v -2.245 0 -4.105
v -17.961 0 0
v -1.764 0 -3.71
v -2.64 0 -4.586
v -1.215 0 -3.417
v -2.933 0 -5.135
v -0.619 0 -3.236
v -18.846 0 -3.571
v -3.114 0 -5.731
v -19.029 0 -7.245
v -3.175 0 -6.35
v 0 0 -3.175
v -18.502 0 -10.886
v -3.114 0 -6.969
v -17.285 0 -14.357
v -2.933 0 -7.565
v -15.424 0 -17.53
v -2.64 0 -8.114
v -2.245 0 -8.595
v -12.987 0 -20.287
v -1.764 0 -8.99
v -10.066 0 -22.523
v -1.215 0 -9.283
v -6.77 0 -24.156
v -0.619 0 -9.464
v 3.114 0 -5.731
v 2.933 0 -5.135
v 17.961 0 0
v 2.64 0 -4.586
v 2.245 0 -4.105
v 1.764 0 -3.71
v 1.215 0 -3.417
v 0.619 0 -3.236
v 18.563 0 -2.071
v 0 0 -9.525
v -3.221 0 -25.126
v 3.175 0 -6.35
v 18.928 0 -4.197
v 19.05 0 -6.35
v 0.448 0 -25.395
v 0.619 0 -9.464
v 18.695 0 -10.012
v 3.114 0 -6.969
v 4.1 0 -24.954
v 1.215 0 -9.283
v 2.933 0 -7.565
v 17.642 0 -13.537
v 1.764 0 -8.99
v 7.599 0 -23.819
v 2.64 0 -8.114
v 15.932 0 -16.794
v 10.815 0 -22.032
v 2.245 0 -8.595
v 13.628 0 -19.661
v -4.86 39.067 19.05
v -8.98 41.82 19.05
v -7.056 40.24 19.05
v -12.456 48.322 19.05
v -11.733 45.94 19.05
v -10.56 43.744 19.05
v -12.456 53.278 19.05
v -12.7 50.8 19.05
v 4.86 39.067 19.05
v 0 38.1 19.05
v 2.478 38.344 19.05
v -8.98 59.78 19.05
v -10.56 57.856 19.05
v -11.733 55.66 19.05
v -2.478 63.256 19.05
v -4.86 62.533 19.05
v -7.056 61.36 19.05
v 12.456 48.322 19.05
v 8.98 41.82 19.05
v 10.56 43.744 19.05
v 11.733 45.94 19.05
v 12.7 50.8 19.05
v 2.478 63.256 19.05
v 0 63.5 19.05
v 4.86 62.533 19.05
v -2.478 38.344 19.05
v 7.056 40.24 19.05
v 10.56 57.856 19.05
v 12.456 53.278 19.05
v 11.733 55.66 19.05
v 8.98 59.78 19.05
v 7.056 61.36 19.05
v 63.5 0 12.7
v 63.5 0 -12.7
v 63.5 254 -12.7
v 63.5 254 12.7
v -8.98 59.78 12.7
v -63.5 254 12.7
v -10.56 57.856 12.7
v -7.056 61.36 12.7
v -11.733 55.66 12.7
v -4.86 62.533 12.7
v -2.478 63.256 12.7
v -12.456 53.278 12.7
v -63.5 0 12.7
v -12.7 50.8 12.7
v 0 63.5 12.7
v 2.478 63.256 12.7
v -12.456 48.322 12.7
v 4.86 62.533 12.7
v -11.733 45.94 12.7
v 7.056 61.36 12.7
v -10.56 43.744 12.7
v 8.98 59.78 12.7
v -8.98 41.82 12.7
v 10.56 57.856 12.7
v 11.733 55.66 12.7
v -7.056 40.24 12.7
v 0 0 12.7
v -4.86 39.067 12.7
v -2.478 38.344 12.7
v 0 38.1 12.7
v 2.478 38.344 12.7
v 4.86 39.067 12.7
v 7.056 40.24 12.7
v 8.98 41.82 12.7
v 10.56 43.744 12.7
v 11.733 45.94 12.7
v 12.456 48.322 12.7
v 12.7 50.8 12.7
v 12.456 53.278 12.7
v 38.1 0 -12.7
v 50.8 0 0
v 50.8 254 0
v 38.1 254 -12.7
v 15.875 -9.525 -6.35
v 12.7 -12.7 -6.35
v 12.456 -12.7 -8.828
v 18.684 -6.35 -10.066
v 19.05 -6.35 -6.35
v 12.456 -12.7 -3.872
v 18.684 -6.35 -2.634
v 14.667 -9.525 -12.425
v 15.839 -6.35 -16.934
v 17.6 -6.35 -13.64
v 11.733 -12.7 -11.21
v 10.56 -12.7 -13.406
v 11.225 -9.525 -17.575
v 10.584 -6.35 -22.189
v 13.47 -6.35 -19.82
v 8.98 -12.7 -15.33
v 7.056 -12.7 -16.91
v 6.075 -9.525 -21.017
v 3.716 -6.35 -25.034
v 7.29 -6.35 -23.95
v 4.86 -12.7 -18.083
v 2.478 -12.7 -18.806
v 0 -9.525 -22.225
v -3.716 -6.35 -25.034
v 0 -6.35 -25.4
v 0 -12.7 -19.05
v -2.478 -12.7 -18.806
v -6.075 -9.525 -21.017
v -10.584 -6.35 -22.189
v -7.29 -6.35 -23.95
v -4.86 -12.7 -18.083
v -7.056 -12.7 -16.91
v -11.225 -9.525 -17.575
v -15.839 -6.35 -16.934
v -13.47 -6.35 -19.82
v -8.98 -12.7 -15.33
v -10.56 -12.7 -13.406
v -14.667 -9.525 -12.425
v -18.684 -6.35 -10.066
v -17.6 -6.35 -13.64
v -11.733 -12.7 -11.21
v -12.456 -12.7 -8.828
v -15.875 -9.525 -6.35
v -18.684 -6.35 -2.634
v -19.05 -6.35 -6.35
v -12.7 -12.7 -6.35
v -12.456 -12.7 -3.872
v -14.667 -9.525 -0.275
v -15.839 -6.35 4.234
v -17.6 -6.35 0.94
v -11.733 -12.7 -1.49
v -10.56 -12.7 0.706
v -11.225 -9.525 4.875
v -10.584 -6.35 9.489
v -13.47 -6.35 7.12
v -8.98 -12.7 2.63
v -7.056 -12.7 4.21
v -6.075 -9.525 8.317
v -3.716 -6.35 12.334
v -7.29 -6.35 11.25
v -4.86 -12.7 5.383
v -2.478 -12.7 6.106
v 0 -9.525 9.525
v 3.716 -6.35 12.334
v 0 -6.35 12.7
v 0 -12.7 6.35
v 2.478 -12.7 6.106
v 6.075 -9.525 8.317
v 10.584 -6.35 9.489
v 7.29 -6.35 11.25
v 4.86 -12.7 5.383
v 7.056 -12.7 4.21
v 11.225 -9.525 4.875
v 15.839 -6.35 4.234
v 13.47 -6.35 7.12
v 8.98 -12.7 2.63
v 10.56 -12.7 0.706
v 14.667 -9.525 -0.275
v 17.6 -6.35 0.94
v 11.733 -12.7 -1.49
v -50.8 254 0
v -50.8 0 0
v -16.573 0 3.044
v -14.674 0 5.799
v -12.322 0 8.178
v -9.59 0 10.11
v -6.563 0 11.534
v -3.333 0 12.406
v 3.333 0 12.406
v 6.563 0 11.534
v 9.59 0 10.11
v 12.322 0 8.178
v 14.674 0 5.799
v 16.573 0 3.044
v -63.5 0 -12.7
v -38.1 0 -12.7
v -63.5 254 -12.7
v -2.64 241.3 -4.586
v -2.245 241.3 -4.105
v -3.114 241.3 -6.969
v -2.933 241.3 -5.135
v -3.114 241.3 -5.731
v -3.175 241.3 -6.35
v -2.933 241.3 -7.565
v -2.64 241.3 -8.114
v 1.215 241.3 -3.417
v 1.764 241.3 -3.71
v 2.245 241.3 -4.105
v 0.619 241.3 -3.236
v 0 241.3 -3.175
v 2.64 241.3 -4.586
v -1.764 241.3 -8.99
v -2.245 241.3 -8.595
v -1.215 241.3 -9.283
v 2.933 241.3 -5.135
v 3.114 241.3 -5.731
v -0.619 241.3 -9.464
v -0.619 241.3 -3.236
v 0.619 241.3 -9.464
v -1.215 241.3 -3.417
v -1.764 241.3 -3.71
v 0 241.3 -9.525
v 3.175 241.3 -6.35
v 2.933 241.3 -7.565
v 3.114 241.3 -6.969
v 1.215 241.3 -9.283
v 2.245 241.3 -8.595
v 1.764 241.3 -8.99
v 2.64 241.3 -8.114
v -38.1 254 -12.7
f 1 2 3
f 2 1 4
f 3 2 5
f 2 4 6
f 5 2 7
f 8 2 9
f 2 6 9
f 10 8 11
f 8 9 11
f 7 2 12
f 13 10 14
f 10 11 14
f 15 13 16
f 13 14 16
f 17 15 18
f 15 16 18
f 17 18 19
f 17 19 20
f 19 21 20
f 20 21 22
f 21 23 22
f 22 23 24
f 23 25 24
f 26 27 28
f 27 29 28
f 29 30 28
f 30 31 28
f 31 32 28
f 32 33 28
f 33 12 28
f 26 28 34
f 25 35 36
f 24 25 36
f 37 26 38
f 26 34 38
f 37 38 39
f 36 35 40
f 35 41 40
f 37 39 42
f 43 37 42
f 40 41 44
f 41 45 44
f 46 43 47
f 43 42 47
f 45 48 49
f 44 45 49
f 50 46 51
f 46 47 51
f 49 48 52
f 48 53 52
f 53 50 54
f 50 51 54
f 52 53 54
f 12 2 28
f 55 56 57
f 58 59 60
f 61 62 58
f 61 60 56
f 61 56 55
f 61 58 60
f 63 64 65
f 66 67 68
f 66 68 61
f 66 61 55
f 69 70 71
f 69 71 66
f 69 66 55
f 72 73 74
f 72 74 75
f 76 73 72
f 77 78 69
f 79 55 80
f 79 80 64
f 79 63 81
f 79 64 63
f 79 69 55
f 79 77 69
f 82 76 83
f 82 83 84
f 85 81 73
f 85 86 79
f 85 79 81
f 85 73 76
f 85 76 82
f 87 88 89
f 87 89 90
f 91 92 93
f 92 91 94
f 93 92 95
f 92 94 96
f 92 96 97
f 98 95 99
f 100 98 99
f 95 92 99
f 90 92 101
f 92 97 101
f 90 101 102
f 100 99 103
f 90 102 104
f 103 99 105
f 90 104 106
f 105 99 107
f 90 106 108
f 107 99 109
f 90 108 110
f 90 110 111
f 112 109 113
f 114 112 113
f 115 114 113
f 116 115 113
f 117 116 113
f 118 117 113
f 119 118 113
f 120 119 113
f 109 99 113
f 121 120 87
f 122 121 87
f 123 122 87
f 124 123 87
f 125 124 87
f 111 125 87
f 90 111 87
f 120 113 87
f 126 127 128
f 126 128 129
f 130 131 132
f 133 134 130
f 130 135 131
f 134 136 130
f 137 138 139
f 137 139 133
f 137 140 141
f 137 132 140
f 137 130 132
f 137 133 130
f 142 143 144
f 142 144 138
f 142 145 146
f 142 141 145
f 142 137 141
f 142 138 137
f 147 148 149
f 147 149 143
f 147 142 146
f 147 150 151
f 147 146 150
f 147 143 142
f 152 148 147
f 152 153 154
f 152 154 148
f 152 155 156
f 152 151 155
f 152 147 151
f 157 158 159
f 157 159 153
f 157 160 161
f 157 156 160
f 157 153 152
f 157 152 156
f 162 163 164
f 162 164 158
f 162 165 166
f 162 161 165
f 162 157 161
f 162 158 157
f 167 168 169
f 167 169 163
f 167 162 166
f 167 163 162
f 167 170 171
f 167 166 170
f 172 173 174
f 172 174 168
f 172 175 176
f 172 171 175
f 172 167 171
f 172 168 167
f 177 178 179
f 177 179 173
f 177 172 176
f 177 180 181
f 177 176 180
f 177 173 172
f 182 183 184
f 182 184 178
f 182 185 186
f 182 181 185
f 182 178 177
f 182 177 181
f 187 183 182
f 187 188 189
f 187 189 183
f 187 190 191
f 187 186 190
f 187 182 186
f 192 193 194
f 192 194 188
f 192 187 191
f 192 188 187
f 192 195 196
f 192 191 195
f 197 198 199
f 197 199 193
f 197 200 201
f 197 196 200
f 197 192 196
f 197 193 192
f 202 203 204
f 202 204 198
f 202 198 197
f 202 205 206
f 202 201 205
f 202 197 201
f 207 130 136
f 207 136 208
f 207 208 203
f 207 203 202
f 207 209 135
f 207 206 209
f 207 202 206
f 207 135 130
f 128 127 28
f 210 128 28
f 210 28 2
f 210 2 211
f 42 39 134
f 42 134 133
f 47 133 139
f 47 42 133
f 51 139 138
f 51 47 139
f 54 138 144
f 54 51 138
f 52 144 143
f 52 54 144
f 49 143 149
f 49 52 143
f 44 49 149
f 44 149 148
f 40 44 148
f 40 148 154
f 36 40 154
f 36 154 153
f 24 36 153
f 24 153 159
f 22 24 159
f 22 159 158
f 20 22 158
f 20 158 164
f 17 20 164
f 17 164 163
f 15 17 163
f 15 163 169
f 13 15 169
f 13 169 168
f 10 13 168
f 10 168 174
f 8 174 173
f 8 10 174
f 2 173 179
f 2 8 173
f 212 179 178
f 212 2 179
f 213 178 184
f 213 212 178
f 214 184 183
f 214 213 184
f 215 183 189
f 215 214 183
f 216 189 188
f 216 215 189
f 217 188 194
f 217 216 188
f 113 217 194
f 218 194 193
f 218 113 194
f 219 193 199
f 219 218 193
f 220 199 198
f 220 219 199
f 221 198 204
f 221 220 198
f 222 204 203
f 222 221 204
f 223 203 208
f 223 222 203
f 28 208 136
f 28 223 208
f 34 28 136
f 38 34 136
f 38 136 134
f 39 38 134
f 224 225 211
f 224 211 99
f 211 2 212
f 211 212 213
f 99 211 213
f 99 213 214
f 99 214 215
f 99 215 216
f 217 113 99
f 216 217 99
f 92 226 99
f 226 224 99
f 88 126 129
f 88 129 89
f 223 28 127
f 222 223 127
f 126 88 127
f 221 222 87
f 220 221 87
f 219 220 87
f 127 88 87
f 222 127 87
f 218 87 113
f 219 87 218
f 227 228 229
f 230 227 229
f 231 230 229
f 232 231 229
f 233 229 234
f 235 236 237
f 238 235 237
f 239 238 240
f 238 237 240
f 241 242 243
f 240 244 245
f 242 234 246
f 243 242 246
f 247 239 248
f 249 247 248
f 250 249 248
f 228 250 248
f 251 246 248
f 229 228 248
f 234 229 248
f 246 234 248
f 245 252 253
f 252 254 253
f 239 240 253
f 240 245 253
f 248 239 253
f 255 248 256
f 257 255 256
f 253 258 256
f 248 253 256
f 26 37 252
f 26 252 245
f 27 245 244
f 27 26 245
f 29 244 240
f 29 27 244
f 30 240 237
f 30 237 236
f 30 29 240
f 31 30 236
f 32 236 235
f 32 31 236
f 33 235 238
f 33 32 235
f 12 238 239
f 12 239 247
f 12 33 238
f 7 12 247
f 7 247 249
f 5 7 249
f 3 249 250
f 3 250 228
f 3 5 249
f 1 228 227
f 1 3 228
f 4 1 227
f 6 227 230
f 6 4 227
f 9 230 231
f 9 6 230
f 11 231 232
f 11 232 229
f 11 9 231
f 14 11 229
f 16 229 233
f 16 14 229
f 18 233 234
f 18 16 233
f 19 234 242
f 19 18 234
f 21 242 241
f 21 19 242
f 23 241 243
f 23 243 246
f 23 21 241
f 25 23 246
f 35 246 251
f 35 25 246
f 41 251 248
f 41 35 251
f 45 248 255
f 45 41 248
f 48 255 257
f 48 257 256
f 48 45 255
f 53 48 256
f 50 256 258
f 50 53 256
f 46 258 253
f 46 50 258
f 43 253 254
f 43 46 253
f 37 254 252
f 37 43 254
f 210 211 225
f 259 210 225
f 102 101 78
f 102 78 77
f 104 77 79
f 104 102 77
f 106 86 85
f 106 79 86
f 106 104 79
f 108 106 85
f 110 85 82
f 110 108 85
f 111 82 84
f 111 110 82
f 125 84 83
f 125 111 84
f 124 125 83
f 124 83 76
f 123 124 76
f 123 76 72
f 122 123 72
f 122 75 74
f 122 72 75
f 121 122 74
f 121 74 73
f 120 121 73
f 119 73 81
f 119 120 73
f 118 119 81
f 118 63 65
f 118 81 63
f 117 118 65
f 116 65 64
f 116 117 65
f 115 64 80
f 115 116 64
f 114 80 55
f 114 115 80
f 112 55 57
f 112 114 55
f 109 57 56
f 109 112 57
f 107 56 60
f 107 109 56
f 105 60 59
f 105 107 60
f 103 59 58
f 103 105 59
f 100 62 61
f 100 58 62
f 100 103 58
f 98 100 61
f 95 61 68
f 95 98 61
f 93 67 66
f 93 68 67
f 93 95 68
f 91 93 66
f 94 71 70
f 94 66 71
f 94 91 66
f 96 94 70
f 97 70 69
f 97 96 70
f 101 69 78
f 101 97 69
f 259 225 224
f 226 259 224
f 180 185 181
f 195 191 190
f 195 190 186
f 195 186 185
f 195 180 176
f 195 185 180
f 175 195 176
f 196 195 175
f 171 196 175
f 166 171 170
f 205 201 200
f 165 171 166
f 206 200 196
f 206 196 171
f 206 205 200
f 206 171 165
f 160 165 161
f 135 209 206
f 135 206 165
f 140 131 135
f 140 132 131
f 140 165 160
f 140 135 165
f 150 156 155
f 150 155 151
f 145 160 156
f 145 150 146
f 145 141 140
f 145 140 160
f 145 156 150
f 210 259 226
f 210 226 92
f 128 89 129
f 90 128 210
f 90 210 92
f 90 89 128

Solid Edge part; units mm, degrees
sketch "Sketch1" plane through (0, 0, 0) normal (0, -1, 0) x (1, 0, 0)
  line L0 (-63.5, 12.7) -> (63.5, 12.7)
  line L1 (63.5, -12.7) -> (63.5, 12.7)
  line L2 (38.1, -12.7) -> (63.5, -12.7)
  line L3 (50.8, 0) -> (38.1, -12.7)
  line L4 (0, 0) -> (50.8, 0)
  line L5 (0, 0) -> (-50.8, 0)
  line L6 (-50.8, 0) -> (-38.1, -12.7)
  line L7 (-38.1, -12.7) -> (-63.5, -12.7)
  line L8 (-63.5, -12.7) -> (-63.5, 12.7)
extrude "Protrusion1" add sketch "Sketch1" against normal blind 254
sketch "Sketch2" plane through (0, 0, 0) normal (0, -1, 0) x (1, 0, 0)
  circle A0 centre (0, -6.35) radius 19.05
extrude "ExtrudedProtrusion_2" add sketch "Sketch2" along normal blind 12.7
chamfer "Chamfer_1" distance 6.35 angle 45 1 edges at (-19.05, -12.7, -6.35)
sketch "Sketch3" plane through (0, 0, 0) normal (0, -1, 0) x (1, 0, 0)
  circle A0 centre (0, -6.35) radius 3.175
extrude "ExtrudedProtrusion_3" add sketch "Sketch3" against normal blind 241.3
sketch "Sketch4" plane through (0, 127, 12.7) normal (0, 0, 1) x (0, 1, 0)
  circle A0 centre (-76.2, 0) radius 12.7
extrude "ExtrudedProtrusion_6" add sketch "Sketch4" along normal blind 6.35
